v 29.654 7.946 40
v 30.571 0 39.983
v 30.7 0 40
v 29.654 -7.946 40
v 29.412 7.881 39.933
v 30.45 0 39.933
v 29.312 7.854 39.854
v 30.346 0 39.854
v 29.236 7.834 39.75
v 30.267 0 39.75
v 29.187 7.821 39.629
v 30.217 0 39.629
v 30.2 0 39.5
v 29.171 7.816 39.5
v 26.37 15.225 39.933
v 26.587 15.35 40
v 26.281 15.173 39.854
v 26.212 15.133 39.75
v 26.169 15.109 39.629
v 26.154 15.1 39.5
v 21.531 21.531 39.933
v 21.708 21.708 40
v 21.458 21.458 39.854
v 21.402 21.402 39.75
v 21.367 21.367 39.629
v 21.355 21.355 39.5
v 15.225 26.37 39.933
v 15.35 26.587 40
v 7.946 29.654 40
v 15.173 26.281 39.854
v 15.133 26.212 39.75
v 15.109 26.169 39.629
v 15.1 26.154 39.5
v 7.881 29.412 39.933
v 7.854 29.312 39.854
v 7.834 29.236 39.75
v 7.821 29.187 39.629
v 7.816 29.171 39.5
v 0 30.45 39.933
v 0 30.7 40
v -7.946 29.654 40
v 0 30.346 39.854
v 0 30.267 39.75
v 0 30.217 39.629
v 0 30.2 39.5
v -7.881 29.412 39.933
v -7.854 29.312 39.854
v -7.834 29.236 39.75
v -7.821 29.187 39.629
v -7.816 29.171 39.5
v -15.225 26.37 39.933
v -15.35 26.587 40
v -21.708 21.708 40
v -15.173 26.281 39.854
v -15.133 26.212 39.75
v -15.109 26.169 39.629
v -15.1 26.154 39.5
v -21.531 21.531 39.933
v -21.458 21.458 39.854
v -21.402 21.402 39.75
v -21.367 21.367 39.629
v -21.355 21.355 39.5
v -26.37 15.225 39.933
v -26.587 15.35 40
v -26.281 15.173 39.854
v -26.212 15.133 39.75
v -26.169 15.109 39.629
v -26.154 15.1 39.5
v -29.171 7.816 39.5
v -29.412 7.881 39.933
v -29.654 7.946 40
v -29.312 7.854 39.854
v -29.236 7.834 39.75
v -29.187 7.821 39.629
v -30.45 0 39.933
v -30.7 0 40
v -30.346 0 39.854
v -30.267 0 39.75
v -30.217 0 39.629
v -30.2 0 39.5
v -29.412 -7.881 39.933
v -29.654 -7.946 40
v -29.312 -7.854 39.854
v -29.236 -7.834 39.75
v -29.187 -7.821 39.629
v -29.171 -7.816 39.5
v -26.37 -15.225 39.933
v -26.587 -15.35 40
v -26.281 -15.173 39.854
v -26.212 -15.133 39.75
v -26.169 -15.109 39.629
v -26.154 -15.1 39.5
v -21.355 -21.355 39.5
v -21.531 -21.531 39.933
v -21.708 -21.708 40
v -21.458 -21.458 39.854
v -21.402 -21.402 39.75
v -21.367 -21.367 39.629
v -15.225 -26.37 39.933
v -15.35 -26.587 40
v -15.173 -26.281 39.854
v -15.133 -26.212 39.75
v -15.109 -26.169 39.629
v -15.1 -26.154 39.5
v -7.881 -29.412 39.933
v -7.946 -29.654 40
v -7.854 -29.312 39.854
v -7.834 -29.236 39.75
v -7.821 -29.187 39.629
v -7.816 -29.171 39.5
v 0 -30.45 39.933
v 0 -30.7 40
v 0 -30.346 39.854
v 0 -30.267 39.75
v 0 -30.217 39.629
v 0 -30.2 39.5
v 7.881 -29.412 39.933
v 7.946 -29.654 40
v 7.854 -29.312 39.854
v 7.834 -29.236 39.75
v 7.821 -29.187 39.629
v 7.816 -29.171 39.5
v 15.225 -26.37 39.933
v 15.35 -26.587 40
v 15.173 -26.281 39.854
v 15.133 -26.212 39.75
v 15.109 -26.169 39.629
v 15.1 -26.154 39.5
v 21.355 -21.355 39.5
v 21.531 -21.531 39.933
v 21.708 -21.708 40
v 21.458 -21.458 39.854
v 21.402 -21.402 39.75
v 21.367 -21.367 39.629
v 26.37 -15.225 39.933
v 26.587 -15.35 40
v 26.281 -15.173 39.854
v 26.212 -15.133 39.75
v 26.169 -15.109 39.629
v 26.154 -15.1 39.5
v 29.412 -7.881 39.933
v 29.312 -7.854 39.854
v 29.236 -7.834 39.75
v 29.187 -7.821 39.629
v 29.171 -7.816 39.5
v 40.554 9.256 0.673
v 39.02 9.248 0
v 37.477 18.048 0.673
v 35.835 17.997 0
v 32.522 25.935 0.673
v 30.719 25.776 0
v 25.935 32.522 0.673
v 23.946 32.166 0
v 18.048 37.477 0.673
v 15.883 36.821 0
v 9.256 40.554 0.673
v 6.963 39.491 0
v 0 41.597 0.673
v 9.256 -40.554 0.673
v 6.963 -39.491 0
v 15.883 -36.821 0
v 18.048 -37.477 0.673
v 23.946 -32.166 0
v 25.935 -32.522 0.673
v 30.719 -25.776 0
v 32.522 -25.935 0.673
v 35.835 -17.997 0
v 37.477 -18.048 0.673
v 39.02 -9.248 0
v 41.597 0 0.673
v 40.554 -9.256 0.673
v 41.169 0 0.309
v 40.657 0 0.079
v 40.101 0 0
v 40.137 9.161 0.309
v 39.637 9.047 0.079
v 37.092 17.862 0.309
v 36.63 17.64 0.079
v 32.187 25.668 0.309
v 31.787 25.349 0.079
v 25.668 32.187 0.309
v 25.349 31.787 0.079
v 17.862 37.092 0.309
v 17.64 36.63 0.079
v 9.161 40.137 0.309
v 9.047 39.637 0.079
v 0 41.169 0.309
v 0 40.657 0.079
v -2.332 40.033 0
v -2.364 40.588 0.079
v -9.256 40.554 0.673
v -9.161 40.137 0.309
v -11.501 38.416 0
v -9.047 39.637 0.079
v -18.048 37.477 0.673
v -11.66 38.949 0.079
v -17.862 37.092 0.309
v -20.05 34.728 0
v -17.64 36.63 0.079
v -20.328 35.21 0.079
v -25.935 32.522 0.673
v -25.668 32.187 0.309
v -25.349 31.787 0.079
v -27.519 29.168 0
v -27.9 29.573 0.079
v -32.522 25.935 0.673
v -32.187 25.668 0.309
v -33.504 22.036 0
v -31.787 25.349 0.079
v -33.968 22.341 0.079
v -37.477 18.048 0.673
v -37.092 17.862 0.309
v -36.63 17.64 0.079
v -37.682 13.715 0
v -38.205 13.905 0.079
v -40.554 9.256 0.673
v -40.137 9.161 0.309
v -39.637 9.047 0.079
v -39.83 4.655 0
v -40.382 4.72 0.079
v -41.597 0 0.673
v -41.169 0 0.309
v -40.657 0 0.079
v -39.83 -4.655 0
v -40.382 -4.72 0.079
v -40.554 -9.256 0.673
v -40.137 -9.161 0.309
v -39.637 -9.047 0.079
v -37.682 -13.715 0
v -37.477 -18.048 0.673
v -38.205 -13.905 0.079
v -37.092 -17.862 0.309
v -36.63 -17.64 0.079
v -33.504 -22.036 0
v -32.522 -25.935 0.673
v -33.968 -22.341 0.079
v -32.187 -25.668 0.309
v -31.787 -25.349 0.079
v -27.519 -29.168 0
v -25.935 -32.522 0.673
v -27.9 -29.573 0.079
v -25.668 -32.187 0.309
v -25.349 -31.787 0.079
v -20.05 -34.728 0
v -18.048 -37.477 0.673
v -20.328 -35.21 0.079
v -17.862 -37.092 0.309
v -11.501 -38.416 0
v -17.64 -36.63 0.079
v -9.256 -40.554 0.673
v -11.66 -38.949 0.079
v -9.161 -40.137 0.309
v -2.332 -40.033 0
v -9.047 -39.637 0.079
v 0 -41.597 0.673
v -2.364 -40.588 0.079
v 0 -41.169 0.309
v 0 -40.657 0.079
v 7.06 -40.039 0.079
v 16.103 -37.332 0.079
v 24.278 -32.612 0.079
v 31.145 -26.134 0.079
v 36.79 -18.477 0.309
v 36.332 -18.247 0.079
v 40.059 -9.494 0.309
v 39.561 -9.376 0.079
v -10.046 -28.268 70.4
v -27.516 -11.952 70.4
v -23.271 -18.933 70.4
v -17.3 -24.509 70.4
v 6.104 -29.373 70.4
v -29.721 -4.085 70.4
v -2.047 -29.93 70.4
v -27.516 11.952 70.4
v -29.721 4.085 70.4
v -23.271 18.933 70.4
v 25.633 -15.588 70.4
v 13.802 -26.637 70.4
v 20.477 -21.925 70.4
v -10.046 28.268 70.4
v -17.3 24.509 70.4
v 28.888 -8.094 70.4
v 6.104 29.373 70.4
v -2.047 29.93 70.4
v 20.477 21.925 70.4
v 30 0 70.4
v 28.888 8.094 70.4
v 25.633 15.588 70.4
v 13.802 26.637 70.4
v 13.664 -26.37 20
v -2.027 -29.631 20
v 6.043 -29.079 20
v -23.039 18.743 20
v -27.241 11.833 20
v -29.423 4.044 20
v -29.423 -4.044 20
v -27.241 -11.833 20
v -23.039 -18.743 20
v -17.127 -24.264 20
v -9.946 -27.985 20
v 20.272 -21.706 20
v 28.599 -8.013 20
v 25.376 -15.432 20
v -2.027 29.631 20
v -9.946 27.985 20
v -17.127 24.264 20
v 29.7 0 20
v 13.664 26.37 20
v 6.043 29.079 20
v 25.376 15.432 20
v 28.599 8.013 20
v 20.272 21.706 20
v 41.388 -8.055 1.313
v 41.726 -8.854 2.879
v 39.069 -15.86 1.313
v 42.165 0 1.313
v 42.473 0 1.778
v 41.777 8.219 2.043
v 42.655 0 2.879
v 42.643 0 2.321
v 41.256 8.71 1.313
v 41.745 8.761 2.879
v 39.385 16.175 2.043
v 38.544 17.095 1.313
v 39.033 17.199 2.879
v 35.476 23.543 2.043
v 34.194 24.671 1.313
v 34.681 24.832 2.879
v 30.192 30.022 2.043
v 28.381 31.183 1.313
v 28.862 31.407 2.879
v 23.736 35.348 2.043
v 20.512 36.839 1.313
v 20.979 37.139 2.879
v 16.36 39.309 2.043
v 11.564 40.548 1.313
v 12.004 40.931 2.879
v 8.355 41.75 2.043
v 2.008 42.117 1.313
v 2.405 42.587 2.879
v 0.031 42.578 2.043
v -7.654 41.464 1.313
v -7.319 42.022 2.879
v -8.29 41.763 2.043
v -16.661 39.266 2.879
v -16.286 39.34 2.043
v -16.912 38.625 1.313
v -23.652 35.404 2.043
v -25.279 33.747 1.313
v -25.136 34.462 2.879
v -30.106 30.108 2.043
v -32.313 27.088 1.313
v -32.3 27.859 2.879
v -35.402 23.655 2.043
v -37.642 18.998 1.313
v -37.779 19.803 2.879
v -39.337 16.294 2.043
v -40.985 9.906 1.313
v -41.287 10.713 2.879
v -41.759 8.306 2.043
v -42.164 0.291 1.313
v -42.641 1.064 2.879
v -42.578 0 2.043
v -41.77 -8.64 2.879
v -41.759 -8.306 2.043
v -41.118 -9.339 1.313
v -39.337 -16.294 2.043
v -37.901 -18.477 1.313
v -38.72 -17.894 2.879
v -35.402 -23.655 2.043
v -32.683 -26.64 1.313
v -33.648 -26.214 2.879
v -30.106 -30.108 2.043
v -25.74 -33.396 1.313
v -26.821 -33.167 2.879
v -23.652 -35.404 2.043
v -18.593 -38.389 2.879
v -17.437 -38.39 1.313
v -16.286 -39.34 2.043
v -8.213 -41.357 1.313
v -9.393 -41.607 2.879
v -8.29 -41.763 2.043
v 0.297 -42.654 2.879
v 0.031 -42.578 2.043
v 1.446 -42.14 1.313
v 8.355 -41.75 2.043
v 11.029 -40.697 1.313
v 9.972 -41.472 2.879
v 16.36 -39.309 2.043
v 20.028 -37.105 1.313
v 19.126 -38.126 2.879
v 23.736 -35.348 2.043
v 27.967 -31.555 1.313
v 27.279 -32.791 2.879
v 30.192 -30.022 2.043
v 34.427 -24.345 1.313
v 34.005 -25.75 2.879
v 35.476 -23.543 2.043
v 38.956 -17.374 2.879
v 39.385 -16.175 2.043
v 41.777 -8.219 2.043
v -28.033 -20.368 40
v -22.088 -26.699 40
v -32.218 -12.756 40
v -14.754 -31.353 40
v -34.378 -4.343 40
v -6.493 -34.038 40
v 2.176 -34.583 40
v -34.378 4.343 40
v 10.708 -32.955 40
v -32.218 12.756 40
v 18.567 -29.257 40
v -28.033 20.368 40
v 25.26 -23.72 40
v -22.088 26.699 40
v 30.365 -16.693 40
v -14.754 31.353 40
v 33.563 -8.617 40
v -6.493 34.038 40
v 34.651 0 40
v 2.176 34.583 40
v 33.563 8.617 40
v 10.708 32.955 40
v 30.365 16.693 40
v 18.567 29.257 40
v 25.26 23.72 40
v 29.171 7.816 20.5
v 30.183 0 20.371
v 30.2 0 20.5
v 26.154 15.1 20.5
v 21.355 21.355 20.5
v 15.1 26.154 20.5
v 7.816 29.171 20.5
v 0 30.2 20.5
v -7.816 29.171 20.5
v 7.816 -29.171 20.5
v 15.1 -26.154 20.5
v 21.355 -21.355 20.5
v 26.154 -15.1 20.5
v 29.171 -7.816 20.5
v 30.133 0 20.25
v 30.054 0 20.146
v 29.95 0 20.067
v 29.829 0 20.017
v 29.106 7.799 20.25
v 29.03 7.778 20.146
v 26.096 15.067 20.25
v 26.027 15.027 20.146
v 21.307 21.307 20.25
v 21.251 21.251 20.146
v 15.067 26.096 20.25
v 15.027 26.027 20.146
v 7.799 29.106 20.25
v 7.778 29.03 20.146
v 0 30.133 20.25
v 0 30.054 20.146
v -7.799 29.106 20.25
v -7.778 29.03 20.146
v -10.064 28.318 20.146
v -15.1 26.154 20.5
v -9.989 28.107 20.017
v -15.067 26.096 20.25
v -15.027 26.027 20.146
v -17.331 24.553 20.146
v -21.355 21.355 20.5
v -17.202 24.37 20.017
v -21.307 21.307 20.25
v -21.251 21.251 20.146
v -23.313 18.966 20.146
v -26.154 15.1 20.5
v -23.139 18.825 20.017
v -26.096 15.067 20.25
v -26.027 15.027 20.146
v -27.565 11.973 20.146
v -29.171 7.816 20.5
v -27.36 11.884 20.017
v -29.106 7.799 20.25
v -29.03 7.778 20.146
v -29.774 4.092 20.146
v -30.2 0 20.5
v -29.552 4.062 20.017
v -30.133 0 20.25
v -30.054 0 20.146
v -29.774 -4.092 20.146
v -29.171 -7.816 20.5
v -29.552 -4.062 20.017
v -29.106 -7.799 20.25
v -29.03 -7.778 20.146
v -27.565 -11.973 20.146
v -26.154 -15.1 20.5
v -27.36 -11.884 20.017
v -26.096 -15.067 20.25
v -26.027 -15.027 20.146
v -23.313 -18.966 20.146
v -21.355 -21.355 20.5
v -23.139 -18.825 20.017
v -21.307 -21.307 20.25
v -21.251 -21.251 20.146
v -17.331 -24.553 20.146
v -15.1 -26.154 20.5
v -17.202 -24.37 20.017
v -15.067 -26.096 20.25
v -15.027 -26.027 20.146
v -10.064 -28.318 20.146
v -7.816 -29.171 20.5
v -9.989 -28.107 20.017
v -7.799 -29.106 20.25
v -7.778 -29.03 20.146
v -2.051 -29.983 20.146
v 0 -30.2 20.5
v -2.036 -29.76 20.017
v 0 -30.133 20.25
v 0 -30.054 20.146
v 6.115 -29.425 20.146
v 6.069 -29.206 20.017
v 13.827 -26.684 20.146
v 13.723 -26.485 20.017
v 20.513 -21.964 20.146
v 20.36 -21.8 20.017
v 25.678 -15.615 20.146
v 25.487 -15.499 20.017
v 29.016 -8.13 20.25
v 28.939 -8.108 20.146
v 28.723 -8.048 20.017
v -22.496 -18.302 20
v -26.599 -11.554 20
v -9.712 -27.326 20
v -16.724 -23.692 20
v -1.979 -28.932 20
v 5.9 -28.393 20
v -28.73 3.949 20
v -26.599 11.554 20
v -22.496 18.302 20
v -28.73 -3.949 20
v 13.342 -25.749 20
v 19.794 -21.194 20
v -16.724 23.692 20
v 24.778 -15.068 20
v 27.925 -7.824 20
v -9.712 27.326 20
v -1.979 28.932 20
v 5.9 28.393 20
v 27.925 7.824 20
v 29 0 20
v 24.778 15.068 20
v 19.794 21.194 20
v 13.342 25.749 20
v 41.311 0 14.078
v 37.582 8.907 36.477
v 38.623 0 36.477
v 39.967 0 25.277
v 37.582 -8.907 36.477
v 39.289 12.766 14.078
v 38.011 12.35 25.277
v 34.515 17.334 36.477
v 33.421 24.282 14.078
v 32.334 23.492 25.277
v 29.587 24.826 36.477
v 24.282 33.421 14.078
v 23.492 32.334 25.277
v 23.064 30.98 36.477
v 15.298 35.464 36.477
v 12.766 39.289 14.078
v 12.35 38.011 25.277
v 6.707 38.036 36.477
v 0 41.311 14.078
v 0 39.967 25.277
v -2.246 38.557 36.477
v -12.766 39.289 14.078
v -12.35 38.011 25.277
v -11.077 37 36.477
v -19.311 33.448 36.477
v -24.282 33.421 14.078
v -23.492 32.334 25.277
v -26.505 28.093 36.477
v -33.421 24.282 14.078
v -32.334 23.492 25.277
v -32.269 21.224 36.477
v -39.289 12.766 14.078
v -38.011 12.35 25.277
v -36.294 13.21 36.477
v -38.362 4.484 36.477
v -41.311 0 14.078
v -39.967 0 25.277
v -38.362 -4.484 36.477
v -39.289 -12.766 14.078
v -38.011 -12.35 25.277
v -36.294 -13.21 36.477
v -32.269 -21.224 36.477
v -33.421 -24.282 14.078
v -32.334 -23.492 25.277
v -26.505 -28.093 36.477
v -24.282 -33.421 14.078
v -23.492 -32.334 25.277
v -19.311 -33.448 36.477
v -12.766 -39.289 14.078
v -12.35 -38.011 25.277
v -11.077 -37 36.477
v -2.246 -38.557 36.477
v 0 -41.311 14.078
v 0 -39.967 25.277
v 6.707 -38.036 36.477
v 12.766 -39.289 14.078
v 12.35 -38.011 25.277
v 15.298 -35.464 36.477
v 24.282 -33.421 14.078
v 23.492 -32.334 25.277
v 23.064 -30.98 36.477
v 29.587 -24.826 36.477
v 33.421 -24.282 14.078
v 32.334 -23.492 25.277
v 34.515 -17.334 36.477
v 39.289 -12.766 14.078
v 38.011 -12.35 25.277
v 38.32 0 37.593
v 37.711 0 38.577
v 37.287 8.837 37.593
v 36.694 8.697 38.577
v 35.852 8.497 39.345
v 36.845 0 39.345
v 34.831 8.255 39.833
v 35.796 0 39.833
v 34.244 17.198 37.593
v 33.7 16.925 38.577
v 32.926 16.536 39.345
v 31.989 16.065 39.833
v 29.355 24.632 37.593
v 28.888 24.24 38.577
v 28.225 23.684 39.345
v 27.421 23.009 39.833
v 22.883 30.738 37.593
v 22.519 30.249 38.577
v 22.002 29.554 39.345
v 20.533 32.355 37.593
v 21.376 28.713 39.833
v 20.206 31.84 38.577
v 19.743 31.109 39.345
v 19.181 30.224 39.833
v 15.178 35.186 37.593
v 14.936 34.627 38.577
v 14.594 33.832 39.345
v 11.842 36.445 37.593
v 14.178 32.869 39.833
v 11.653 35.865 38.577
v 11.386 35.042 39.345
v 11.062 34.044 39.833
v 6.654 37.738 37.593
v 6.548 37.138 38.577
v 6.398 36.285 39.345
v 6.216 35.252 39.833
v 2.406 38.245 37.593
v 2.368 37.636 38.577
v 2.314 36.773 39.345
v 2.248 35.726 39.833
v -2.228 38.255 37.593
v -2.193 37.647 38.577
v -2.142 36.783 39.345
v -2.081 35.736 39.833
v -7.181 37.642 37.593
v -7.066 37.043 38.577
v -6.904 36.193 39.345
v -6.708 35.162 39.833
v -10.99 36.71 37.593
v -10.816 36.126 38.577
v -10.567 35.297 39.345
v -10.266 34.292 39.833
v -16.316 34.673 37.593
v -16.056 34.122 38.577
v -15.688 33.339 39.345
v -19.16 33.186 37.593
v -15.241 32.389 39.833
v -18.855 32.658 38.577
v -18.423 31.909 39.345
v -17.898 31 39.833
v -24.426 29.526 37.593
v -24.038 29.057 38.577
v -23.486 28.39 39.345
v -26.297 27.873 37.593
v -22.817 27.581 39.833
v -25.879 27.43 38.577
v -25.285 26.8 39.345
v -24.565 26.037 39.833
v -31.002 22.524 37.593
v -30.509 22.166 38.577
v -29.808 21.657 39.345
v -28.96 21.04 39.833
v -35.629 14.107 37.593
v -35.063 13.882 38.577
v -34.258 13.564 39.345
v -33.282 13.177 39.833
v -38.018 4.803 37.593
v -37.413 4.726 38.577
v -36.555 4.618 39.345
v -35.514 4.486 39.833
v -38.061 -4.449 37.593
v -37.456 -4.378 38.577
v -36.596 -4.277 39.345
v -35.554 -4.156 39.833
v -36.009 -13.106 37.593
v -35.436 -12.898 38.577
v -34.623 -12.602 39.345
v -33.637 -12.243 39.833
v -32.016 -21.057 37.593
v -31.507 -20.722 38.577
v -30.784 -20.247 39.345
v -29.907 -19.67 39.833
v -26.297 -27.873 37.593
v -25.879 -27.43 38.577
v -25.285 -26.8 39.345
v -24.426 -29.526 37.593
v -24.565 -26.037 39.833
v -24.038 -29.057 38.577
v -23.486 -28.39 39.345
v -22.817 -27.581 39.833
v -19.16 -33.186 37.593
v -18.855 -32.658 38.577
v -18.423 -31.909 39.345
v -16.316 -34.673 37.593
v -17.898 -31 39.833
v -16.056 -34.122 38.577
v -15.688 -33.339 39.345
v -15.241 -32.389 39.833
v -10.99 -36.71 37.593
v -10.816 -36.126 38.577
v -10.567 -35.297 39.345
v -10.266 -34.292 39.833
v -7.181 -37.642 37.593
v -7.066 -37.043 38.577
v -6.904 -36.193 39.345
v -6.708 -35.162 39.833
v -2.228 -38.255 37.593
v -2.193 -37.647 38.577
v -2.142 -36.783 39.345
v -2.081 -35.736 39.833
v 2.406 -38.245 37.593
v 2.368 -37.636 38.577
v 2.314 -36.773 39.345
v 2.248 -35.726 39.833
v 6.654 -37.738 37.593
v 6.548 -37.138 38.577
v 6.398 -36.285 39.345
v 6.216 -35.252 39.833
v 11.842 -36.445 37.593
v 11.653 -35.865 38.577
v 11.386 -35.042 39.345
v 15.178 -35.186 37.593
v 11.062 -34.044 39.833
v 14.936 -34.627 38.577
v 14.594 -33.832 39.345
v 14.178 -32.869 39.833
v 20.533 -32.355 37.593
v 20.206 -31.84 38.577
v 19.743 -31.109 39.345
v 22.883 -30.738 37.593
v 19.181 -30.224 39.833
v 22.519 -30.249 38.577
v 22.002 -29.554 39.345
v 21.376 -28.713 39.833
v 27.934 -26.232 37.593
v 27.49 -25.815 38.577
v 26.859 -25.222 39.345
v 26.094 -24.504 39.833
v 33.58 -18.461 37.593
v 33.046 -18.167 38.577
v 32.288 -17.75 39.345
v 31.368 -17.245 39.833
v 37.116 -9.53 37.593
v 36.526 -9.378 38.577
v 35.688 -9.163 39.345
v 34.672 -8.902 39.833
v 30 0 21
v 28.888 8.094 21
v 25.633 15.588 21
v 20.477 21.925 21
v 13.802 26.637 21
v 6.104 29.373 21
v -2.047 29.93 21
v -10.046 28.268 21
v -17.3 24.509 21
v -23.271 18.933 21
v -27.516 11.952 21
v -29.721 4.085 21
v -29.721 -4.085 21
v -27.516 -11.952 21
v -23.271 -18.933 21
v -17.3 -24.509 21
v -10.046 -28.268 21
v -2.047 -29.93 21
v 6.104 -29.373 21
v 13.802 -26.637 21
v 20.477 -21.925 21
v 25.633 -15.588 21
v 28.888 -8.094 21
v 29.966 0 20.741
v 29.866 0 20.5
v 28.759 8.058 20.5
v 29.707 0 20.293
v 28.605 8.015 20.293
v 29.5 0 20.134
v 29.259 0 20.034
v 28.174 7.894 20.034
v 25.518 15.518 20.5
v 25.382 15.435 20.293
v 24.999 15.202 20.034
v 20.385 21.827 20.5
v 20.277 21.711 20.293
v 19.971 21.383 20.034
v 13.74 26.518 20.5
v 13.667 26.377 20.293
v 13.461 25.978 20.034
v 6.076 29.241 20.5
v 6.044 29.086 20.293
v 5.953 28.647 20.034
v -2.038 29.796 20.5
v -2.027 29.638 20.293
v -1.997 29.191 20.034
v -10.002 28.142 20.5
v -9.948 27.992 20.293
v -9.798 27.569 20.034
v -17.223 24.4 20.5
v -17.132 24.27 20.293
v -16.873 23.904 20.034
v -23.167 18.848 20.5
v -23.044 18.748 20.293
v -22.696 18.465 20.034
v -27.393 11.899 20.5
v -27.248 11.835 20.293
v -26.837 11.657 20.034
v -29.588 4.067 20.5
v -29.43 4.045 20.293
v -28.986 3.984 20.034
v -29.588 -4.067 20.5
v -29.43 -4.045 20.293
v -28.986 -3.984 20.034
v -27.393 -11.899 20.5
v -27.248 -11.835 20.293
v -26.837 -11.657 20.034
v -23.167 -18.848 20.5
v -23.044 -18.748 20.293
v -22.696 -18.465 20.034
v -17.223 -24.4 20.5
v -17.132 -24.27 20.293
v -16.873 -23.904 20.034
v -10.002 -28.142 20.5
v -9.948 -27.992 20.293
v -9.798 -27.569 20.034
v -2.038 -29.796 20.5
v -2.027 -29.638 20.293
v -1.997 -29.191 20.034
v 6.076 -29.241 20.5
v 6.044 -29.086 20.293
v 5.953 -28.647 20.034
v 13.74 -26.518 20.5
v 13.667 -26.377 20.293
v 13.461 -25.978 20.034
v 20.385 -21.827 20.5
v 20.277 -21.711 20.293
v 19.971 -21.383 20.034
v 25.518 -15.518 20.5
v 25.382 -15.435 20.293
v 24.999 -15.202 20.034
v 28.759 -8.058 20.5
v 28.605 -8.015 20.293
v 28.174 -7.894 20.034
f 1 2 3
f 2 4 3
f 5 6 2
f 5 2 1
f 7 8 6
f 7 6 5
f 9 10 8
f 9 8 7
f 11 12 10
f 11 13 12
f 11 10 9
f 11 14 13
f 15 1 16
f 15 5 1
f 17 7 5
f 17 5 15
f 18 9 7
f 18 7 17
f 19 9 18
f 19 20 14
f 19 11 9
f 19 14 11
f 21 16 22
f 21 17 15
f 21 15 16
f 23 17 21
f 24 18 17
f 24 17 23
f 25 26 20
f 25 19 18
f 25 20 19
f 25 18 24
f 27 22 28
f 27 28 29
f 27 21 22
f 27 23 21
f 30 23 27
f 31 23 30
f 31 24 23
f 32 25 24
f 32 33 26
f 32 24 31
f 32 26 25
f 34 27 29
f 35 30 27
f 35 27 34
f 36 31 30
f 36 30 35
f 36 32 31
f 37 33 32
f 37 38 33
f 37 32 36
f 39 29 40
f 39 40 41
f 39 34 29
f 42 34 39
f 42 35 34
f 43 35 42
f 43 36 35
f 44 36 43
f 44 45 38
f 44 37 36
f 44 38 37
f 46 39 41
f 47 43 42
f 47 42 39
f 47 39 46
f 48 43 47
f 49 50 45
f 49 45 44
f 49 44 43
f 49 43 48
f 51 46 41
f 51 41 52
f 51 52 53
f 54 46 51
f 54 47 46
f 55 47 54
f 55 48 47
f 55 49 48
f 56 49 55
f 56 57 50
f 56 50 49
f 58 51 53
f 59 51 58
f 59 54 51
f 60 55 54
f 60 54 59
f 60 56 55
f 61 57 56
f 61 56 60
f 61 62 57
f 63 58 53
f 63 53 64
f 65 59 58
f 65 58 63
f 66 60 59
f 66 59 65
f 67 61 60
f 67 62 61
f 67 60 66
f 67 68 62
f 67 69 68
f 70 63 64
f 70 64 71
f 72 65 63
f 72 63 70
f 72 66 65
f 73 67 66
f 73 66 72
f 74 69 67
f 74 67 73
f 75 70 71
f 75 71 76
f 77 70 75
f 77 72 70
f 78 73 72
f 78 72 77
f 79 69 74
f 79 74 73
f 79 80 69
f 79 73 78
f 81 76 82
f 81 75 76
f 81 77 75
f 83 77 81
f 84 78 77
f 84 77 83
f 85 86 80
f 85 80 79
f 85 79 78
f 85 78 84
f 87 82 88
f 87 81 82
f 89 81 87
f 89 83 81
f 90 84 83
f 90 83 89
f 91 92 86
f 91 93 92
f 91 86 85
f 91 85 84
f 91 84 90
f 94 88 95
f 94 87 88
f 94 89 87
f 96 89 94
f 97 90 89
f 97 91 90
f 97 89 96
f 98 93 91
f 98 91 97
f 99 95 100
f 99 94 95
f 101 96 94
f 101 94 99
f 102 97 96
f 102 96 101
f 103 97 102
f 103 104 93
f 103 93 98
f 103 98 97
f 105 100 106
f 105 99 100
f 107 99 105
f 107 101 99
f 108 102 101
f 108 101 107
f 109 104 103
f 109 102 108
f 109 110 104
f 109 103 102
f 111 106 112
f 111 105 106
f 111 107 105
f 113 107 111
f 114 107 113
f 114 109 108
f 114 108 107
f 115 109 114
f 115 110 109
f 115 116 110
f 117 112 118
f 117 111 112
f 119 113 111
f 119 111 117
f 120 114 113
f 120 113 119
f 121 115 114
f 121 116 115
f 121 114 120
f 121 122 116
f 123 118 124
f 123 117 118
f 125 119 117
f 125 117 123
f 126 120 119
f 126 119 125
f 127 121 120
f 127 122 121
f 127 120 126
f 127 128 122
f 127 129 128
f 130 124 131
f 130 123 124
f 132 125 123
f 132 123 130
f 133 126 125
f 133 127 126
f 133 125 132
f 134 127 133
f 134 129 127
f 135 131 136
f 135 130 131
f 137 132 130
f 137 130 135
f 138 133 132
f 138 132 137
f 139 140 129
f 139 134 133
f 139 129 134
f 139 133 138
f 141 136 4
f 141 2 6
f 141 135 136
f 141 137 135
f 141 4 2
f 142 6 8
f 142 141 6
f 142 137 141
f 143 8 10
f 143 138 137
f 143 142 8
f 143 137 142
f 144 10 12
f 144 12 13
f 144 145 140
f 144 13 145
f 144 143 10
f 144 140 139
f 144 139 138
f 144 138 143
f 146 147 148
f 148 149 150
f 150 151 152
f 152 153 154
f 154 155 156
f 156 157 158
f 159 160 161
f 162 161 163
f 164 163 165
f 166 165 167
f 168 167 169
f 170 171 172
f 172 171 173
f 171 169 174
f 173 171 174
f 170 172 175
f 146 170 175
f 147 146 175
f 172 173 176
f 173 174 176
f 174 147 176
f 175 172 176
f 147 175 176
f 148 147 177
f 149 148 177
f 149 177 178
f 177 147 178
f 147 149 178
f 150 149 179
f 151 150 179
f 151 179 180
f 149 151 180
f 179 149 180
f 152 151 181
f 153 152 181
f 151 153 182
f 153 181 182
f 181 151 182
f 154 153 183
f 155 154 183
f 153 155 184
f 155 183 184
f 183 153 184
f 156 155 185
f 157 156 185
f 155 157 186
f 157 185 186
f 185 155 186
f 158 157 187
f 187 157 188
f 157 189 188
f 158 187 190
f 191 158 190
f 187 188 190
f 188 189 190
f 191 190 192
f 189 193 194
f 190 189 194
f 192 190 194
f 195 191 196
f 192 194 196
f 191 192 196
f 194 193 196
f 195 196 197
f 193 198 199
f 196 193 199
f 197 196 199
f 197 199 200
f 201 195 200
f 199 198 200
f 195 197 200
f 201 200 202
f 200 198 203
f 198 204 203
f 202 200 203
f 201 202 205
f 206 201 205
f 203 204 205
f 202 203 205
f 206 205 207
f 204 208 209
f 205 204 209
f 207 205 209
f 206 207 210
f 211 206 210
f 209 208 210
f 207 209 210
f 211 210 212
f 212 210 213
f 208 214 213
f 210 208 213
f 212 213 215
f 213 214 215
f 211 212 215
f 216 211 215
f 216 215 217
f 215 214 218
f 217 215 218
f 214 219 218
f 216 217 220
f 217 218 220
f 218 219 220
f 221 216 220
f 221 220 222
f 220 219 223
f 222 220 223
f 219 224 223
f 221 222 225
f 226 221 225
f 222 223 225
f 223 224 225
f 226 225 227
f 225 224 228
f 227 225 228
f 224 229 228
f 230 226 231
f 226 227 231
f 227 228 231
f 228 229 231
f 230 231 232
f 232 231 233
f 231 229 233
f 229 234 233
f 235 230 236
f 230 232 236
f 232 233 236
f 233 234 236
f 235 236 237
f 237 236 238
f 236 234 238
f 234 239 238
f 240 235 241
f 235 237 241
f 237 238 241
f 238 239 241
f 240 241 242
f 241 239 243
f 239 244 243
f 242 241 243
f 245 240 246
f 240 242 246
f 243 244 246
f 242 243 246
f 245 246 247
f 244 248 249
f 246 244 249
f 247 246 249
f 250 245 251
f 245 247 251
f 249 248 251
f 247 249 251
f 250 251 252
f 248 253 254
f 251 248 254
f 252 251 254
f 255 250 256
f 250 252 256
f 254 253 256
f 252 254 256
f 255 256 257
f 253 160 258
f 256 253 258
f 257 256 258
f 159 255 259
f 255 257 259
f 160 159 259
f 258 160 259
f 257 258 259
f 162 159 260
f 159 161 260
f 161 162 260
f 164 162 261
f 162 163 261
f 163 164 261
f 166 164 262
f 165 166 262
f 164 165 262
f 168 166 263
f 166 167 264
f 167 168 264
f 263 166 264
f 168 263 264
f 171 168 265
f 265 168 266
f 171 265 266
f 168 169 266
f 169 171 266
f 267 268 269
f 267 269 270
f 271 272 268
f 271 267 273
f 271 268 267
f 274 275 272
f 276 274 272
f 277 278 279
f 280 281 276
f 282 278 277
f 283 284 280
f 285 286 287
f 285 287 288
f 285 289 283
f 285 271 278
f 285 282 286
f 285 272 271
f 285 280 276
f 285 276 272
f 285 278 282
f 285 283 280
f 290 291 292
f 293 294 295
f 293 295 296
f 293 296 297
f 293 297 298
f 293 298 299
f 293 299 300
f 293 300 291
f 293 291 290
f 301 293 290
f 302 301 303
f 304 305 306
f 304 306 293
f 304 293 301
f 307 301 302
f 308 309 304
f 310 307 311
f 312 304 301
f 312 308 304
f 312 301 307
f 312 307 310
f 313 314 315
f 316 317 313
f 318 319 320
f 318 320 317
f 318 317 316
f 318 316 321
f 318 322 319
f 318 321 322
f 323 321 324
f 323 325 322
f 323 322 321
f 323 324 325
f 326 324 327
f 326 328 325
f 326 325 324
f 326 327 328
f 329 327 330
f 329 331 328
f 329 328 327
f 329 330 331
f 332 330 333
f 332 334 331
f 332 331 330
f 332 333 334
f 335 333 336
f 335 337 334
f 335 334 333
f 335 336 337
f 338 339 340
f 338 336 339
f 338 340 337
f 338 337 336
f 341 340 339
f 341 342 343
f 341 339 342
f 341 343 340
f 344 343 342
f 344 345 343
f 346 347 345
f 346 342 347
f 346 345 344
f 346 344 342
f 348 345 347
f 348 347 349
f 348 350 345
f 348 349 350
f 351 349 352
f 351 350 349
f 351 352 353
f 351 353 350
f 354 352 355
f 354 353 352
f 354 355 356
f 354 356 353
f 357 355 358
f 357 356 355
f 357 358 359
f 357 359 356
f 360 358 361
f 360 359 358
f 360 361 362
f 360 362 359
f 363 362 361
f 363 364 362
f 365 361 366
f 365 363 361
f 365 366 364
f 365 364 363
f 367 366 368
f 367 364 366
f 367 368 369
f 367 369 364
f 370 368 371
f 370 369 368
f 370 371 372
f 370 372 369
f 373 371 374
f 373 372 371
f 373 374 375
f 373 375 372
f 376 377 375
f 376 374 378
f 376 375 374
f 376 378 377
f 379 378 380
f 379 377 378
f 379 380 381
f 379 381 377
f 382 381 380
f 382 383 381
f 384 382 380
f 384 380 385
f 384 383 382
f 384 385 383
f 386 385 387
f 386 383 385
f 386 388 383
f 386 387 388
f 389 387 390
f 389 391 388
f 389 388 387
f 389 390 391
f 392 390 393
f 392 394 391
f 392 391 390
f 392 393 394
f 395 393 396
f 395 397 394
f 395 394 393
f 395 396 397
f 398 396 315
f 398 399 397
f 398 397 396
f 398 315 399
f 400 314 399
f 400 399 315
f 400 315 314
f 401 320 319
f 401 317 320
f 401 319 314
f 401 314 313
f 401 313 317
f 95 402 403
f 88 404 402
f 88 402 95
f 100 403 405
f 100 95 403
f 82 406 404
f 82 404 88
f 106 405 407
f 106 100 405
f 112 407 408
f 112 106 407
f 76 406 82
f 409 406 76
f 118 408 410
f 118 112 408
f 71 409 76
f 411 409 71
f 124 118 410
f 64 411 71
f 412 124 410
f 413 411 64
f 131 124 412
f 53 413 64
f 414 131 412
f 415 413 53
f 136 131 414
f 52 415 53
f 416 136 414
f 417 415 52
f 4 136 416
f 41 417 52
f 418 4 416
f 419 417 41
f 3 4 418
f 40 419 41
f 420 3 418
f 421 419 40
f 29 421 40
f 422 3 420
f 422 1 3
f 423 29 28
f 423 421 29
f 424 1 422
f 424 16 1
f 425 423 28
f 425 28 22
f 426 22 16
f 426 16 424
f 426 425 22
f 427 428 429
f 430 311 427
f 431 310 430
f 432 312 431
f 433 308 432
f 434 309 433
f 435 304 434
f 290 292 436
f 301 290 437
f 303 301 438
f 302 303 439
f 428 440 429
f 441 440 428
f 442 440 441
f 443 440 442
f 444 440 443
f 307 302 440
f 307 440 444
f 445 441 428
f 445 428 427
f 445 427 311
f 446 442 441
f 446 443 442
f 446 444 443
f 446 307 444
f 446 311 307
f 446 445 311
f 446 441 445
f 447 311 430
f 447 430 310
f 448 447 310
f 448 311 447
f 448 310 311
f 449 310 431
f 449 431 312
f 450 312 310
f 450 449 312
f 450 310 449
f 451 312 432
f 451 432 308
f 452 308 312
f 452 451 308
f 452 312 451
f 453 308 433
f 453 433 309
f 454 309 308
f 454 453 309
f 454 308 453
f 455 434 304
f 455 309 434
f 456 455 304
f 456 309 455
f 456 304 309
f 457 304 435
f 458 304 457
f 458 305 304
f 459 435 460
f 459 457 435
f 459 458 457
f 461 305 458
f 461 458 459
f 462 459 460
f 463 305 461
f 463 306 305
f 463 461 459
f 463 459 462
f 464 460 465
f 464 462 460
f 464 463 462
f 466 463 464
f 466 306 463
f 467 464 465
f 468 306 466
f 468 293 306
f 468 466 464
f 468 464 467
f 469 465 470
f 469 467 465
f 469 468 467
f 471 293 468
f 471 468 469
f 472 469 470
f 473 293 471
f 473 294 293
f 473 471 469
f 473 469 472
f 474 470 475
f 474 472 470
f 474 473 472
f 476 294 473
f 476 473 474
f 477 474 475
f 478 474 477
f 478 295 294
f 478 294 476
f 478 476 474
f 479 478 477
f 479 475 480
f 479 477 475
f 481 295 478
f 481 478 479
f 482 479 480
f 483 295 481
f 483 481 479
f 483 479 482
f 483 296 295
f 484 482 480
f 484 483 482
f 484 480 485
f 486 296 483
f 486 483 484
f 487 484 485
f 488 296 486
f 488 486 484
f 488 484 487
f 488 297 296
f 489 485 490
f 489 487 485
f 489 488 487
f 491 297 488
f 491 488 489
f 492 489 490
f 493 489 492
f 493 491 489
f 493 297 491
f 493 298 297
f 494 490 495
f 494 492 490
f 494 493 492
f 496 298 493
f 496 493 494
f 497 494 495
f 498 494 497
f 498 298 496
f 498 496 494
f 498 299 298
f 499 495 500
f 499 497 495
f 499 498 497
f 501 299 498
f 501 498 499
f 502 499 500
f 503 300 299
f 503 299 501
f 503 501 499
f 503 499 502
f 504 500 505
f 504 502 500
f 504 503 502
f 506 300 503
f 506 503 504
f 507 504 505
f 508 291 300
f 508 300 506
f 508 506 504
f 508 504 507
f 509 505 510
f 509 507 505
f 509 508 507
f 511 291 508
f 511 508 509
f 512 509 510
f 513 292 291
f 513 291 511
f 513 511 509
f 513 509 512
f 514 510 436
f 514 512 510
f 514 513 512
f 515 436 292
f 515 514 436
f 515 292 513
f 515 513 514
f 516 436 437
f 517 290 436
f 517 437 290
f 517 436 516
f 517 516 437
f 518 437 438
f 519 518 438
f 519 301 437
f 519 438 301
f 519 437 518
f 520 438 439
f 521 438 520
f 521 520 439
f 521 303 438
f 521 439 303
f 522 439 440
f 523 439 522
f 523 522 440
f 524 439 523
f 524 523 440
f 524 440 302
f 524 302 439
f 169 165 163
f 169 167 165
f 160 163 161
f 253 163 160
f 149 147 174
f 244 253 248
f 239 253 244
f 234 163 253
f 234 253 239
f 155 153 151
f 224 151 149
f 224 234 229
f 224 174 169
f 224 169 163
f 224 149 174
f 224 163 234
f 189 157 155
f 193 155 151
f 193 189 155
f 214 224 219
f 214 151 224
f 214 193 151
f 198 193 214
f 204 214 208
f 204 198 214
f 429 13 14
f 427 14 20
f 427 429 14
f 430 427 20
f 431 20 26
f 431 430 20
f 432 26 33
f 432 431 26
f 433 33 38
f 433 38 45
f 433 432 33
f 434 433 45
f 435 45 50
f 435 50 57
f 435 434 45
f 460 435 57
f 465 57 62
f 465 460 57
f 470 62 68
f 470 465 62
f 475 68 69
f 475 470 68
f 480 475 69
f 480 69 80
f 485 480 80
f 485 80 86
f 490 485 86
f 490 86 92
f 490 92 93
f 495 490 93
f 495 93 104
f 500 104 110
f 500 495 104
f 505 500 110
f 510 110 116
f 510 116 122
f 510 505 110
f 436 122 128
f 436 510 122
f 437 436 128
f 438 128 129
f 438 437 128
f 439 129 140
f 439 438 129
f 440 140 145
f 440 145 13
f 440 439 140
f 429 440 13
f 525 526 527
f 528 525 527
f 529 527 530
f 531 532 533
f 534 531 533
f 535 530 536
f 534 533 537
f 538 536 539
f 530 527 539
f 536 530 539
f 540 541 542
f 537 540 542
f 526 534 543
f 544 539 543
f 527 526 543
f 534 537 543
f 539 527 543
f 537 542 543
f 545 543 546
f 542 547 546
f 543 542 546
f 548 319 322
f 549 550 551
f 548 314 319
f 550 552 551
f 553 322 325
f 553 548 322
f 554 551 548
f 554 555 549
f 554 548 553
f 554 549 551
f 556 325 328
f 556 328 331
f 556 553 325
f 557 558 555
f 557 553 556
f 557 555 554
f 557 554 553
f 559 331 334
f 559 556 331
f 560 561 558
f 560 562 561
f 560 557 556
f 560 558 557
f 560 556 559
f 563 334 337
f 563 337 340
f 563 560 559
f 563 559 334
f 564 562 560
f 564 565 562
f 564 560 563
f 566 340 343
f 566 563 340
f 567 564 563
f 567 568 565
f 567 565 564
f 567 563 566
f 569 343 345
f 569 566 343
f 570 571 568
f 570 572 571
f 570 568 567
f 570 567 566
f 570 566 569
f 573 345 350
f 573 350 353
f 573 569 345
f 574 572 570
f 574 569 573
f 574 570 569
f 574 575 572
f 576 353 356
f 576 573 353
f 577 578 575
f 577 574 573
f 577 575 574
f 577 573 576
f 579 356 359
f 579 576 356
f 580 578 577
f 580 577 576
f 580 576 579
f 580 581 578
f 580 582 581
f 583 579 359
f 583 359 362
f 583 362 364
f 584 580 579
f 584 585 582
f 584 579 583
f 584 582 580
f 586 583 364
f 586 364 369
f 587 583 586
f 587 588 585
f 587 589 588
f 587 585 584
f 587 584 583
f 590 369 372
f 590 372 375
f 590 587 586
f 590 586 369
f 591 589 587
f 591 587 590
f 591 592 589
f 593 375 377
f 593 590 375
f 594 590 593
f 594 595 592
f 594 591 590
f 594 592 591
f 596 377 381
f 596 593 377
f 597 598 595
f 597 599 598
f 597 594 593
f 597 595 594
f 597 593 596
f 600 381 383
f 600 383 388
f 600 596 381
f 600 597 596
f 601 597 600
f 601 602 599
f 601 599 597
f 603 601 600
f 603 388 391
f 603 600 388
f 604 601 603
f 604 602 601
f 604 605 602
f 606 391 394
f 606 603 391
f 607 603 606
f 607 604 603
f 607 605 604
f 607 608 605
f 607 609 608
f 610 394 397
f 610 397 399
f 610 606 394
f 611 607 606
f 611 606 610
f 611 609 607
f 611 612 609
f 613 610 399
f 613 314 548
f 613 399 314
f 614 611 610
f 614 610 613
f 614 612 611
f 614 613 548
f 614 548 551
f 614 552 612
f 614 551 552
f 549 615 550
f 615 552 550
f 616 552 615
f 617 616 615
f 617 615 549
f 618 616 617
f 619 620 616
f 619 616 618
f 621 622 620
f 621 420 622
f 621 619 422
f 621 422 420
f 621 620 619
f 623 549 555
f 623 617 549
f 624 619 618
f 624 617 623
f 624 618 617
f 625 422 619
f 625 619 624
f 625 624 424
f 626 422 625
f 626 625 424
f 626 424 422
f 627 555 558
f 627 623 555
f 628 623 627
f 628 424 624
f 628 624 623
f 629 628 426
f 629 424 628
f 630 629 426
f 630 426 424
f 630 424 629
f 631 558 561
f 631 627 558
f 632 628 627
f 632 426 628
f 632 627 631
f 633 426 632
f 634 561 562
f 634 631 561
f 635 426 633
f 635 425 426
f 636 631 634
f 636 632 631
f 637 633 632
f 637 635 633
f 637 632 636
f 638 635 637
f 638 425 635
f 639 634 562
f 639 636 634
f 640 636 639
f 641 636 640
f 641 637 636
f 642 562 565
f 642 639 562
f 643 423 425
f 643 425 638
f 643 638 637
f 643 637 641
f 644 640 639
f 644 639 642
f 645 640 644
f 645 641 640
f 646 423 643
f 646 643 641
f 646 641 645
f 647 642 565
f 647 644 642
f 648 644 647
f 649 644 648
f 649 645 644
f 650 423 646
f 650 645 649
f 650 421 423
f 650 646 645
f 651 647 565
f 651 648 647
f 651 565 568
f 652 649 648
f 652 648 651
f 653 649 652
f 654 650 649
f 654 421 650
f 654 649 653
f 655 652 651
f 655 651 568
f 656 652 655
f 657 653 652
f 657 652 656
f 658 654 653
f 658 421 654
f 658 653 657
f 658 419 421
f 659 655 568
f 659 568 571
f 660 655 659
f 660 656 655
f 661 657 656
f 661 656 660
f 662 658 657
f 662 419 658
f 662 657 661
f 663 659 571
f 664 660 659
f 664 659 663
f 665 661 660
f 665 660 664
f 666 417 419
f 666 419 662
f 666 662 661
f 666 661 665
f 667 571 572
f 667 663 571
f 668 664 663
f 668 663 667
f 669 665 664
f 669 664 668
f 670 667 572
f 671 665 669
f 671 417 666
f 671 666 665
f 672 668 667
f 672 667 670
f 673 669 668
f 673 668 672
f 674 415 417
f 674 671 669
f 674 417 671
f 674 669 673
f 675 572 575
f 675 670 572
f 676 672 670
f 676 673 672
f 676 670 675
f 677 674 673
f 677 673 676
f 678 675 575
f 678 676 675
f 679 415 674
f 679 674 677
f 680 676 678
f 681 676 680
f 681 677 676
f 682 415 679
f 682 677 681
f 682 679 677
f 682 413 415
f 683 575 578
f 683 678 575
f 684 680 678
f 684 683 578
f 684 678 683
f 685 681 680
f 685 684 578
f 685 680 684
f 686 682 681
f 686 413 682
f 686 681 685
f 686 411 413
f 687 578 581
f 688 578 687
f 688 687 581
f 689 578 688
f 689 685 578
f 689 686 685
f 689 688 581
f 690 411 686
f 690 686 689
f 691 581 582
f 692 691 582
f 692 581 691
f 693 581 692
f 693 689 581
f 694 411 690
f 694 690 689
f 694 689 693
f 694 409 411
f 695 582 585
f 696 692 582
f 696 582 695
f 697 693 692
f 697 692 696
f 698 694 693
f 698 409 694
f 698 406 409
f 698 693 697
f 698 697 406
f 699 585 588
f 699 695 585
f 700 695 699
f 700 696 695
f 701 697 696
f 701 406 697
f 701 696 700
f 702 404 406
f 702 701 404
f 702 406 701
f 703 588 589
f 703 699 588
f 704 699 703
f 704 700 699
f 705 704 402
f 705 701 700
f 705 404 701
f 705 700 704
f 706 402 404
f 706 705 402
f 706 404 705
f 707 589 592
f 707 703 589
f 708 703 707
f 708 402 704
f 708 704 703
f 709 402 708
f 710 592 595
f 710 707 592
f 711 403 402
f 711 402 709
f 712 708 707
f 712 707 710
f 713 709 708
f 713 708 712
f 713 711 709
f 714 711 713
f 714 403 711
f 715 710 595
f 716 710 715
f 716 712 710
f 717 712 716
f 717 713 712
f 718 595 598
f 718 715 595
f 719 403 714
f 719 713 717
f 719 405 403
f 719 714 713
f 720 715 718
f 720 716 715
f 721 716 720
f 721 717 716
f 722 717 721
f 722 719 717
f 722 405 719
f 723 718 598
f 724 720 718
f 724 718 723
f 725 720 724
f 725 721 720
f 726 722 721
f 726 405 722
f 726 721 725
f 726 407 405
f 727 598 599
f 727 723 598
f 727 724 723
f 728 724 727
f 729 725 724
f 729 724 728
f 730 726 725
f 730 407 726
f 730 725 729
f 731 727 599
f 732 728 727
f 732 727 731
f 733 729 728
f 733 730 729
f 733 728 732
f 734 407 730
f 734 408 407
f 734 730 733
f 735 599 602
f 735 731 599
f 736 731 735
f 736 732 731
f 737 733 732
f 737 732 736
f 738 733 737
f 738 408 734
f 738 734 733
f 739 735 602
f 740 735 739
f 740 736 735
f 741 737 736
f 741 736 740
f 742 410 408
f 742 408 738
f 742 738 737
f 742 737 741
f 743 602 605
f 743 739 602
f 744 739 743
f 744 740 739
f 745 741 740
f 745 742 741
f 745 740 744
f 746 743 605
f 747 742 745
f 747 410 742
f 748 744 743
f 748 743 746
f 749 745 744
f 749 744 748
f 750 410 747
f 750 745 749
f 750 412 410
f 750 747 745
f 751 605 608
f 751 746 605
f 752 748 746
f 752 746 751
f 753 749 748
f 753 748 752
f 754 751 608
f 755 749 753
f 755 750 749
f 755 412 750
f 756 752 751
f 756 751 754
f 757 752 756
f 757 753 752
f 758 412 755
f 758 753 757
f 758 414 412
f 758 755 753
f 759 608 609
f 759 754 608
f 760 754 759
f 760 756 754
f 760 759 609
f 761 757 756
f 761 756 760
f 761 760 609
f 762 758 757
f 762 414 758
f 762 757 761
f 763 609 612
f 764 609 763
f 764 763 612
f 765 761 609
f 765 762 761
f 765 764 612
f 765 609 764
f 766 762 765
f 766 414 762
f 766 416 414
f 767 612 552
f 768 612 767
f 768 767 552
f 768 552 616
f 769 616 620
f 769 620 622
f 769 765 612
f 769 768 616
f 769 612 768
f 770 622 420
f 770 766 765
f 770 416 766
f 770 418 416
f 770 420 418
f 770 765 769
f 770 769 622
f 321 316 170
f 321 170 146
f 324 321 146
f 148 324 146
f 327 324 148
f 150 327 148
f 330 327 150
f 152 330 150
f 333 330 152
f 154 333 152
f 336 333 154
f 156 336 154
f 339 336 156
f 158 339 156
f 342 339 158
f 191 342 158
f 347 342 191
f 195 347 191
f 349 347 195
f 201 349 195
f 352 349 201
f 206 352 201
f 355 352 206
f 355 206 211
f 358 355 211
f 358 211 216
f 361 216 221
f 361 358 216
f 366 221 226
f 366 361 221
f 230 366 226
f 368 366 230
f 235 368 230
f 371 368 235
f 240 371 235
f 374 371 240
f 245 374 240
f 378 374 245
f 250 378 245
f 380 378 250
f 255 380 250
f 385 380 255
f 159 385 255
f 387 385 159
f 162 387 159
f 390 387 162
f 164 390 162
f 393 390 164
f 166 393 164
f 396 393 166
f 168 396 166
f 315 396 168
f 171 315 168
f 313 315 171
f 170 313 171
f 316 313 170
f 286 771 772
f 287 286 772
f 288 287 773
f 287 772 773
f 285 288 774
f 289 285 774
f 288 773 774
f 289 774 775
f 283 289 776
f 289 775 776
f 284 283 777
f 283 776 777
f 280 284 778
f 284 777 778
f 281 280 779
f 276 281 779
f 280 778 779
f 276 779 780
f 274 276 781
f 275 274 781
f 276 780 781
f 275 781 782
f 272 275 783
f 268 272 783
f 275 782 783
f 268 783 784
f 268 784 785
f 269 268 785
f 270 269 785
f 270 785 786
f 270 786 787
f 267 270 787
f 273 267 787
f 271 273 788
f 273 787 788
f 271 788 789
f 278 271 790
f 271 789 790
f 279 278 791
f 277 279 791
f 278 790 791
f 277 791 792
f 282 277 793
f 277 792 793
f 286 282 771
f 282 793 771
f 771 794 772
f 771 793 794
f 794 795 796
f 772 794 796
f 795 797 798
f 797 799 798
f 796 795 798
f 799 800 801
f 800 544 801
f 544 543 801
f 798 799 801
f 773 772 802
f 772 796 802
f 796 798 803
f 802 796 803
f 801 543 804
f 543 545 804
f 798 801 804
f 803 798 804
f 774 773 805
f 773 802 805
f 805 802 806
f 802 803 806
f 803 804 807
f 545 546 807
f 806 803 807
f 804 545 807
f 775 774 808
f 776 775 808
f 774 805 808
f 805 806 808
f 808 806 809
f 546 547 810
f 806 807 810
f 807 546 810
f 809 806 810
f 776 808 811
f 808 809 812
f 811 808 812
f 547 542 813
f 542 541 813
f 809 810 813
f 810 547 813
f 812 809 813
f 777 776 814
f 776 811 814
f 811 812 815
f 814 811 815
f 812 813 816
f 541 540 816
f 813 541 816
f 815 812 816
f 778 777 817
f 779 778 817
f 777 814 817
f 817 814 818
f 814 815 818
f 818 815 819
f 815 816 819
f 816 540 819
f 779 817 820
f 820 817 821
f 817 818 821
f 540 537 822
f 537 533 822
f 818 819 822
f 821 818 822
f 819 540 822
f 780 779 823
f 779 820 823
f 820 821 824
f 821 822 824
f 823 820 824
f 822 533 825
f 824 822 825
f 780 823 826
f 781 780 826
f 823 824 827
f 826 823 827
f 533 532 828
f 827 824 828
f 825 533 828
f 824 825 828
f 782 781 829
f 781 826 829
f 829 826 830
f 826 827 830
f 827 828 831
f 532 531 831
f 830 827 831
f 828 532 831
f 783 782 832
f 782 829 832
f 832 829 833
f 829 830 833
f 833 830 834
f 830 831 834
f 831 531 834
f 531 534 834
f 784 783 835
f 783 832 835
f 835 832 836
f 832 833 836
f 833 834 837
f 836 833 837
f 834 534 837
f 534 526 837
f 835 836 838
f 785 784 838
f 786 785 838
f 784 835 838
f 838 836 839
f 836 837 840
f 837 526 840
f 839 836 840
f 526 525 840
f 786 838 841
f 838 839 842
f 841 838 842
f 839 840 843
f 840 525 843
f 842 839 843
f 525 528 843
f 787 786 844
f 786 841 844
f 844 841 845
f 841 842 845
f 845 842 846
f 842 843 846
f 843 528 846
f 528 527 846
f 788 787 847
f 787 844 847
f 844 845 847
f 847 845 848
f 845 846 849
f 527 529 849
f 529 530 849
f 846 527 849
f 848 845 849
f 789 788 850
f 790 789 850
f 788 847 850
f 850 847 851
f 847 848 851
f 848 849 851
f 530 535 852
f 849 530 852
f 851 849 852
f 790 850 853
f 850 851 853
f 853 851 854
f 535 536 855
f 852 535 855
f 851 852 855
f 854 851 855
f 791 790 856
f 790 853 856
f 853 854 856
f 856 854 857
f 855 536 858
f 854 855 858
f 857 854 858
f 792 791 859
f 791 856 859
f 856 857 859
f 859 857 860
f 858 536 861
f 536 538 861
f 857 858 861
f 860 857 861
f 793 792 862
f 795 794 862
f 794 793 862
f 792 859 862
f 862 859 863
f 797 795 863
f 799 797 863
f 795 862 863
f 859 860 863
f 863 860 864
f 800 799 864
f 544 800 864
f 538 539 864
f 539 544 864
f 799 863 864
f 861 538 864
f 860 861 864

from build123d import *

# Parameters (mm, degrees)
F2_SIZE  = 2
F3_R     = 0.5
F4_R     = 2
F5_R     = 4
F7_START = 20
F6_R     = 30
F7_DEPTH = 50.4
F8_R     = 1
F9_R     = 0.5


with BuildPart() as f1:
    # F0 (on Front) → F1 (revolve)
    with BuildSketch(Plane.XZ):
        Polygon((0, 20), (0, 0), (43, 0), (38.2, 40), (30.2, 40), (30.2, 20), align=None)
    revolve(axis=Axis((0, 0, 10), (0, 0, 1)))

    # F2
    f2_edges = [f1.edges().sort_by_distance(p)[0] for p in [
        (-43, 0, 0),
    ]]
    chamfer(f2_edges, length=F2_SIZE)

    # F3
    f3_edges = [f1.edges().sort_by_distance(p)[0] for p in [
        (-30.2, 0, 20),
    ]]
    fillet(f3_edges, radius=F3_R)

    # F4
    f4_edges = [f1.edges().sort_by_distance(p)[0] for p in [
        (-42.76171, 0, 1.985754),
        (-41, 0, 0),
    ]]
    fillet(f4_edges, radius=F4_R)

    # F5
    f5_edges = [f1.edges().sort_by_distance(p)[0] for p in [
        (-38.2, 0, 40),
    ]]
    fillet(f5_edges, radius=F5_R)

    # F9
    f9_edges = [f1.edges().sort_by_distance(p)[0] for p in [
        (-30.2, 0, 40),
    ]]
    fillet(f9_edges, radius=F9_R)


with BuildPart() as f7:
    # F6 (on Top) → F7 (new body)
    with BuildSketch(Plane.XY.offset(F7_START)):
        Circle(F6_R)
    extrude(amount=F7_DEPTH)

    # F8
    f8_edges = [f7.edges().sort_by_distance(p)[0] for p in [
        (-30, 0, 20),
    ]]
    fillet(f8_edges, radius=F8_R)


solid = Compound([f1.part, f7.part])
